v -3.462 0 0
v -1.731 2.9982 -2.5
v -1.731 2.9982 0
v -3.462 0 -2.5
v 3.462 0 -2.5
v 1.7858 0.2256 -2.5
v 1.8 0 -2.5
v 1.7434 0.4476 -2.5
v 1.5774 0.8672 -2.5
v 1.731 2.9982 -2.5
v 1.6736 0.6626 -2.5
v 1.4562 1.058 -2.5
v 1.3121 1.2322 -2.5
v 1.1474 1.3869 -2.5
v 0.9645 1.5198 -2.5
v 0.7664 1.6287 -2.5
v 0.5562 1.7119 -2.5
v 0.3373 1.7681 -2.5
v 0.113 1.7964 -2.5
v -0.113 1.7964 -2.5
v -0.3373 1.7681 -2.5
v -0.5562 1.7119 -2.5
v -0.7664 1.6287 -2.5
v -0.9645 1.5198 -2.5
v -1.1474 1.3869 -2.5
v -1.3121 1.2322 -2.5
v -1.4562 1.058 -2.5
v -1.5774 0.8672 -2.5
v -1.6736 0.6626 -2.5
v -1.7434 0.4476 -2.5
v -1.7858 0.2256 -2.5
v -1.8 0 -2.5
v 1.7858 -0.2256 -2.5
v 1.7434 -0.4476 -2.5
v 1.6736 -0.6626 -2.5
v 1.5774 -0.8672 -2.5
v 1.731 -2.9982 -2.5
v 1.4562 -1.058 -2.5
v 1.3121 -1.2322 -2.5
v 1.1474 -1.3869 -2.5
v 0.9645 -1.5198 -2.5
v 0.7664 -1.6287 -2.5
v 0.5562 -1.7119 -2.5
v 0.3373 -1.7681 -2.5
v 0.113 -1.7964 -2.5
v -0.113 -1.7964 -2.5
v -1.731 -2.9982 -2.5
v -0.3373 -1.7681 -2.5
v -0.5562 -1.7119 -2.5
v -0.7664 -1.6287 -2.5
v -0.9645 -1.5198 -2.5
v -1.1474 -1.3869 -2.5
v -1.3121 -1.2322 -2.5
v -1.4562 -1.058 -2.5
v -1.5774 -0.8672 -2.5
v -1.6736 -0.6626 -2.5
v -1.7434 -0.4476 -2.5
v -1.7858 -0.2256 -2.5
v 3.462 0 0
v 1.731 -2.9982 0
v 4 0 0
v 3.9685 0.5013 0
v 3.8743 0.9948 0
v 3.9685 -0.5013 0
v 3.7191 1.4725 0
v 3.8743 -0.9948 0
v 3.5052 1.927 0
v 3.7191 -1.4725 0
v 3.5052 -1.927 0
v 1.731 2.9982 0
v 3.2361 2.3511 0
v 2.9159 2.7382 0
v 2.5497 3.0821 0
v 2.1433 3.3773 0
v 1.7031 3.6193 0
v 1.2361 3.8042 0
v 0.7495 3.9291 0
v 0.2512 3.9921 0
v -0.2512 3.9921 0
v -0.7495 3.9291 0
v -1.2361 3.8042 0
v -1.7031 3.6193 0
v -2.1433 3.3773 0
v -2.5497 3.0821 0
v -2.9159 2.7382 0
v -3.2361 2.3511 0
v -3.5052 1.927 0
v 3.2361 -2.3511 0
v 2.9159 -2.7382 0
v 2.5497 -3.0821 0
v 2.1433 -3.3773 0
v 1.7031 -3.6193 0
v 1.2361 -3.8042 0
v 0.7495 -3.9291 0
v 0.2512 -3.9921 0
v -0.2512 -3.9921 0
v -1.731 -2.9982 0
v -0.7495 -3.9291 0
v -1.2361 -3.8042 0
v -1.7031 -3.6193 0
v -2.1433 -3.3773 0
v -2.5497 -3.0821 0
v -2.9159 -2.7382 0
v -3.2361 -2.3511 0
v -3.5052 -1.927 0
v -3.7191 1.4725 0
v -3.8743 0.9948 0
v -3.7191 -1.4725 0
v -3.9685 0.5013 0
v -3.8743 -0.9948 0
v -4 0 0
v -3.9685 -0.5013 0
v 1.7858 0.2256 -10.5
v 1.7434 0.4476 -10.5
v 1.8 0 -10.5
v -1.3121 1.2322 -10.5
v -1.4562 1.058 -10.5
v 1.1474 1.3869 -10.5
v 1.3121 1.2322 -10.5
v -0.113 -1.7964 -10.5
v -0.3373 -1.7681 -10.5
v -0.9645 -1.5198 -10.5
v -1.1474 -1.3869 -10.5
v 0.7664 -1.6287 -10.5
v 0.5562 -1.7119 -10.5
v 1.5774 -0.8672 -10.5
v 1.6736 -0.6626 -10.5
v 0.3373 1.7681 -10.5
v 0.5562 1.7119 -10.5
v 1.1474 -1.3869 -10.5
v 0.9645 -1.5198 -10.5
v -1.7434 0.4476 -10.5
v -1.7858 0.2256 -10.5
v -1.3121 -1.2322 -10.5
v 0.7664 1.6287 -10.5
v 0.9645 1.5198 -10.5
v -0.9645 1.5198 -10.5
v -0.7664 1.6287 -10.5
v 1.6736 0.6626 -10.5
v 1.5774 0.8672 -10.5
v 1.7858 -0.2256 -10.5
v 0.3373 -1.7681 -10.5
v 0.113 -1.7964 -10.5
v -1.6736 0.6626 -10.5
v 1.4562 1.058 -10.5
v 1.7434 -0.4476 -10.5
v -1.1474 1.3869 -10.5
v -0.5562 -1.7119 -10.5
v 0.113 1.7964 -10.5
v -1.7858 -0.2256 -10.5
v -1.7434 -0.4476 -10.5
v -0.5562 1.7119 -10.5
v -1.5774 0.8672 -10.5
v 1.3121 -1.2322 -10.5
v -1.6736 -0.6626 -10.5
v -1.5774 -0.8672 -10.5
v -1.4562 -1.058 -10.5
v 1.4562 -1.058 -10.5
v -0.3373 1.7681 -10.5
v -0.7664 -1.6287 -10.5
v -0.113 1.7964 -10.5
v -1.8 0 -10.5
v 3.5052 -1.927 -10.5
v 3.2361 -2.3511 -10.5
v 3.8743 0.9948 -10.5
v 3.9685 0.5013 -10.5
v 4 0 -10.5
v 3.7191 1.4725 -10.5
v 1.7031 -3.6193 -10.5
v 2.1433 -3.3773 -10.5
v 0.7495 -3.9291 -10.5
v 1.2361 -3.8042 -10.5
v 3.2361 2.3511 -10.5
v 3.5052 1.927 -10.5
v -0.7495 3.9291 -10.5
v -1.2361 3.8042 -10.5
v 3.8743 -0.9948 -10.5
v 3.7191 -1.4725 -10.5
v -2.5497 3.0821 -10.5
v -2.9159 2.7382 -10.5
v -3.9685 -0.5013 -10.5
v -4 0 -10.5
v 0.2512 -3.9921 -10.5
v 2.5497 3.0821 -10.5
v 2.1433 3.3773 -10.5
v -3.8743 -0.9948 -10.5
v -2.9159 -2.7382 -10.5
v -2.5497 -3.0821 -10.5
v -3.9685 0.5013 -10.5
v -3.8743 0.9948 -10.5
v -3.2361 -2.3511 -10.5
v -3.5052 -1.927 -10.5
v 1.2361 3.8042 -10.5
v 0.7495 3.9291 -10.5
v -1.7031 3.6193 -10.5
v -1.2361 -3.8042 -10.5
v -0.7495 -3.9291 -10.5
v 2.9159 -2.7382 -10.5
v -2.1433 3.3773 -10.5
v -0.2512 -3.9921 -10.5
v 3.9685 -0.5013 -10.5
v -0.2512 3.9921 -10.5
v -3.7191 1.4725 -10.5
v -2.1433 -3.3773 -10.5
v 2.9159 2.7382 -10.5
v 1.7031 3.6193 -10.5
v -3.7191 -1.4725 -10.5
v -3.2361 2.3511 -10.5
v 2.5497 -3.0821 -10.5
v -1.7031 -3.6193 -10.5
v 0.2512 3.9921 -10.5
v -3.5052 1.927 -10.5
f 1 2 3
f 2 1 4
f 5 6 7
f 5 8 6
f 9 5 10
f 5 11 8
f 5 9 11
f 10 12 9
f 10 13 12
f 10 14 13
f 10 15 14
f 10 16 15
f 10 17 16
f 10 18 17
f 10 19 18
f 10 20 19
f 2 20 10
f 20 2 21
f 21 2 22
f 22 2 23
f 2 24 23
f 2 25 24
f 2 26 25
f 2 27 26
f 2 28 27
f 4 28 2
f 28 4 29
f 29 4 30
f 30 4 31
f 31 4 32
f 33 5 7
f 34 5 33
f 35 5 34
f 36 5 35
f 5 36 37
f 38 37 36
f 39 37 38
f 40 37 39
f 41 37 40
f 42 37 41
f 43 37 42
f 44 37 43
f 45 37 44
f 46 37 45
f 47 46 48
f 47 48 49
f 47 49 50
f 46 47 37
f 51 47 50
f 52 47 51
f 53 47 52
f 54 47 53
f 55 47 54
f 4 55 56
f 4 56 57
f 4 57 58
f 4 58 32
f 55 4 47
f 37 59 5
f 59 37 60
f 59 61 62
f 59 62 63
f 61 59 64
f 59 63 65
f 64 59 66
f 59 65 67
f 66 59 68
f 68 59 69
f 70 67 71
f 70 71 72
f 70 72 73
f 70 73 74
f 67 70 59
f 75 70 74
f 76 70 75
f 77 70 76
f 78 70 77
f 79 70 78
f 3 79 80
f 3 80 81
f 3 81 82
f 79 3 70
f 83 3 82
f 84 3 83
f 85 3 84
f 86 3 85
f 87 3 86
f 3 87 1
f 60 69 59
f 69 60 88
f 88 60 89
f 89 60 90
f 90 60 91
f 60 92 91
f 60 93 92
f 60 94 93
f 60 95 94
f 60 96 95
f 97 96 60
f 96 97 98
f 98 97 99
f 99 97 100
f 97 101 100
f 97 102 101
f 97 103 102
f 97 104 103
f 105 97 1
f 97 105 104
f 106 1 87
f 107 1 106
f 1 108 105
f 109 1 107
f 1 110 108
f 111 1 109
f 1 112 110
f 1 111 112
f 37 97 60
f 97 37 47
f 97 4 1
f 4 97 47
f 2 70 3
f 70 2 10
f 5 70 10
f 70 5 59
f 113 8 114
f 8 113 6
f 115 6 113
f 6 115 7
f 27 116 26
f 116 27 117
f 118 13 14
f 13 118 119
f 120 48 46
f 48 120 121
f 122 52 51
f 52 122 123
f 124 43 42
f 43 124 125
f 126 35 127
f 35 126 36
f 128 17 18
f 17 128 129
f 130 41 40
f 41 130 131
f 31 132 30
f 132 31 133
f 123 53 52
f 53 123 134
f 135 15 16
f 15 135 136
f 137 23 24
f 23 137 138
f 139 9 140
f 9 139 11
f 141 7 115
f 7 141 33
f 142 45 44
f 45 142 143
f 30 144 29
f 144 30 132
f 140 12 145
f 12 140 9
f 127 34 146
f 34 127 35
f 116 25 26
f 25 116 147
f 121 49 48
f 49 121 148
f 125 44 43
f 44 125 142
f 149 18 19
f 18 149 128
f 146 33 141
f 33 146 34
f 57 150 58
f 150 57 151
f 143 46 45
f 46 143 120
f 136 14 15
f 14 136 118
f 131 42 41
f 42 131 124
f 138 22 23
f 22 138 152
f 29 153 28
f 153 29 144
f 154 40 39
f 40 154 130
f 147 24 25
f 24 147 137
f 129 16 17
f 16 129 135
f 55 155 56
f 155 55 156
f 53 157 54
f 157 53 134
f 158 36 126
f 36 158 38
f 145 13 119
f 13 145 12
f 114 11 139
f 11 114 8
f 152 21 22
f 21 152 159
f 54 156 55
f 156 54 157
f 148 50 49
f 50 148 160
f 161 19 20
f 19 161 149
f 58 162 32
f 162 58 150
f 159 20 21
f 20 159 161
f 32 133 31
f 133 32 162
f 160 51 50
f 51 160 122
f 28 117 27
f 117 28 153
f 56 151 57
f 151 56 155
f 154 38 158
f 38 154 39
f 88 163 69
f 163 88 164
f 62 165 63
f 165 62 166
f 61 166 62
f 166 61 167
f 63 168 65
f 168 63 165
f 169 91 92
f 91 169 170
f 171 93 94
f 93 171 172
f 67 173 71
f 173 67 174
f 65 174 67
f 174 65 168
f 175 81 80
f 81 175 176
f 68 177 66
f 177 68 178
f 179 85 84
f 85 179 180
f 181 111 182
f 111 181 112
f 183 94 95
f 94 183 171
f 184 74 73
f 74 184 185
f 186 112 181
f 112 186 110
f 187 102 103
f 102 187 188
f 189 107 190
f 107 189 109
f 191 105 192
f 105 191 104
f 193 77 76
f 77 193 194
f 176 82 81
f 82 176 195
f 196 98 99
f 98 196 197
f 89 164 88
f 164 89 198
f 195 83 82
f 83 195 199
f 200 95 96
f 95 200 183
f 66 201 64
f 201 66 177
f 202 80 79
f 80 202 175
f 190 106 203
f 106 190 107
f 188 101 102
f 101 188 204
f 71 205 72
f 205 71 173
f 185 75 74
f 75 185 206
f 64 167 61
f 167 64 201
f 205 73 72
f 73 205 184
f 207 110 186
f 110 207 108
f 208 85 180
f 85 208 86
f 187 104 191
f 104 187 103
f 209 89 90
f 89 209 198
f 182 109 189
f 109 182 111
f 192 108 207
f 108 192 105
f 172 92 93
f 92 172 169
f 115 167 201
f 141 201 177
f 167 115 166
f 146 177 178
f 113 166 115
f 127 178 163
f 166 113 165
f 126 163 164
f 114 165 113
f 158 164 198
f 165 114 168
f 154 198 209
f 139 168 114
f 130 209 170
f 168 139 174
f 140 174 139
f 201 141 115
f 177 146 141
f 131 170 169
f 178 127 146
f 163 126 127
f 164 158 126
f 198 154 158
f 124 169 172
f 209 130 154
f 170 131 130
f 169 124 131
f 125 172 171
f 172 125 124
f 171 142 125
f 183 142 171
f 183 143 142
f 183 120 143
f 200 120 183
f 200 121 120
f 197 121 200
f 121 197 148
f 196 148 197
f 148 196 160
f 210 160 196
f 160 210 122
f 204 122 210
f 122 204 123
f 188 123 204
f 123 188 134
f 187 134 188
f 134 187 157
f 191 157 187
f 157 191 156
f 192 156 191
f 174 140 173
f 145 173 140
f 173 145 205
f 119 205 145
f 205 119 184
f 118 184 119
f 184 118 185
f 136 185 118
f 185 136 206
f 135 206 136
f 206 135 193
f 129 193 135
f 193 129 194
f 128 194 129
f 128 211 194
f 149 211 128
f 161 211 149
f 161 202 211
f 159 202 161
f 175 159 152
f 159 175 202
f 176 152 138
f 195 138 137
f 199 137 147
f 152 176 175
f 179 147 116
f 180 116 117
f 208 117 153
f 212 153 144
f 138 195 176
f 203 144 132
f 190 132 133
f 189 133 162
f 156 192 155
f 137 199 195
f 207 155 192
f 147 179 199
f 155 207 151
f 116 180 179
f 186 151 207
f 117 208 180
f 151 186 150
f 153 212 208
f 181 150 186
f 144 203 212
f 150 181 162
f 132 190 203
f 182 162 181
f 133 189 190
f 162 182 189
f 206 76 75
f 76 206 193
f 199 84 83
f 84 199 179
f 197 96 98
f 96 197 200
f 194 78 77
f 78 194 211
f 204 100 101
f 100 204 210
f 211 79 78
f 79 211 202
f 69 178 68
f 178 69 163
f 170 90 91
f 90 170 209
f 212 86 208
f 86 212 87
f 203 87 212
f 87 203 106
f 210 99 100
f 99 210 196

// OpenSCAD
$fn = 50;

difference() {
	union() {
		translate(v = [0, 0, -10.5]) {
			cylinder(h = 10.5, r = 4.0);
		}
	}
	union() {
		translate(v = [0, 0, 0]) {
			rotate(a = [0, 0, 0]) {
				difference() {
					union() {
						translate(v = [0, 0, -2.5]) {
							linear_extrude(height = 2.5) {
								polygon(points = [[3.4619999999999997, 0.0], [1.7310000000000003, 2.9981799479017264], [-1.7309999999999992, 2.9981799479017264], [-3.4619999999999997, 4.2397272186481365e-16], [-1.7310000000000014, -2.998179947901726], [1.7309999999999977, -2.9981799479017277]]);
							}
						}
					}
					union();
				}
			}
		}
		#translate(v = [0, 0, -100.0]) {
			cylinder(h = 200, r = 1.8);
		}
	}
}
